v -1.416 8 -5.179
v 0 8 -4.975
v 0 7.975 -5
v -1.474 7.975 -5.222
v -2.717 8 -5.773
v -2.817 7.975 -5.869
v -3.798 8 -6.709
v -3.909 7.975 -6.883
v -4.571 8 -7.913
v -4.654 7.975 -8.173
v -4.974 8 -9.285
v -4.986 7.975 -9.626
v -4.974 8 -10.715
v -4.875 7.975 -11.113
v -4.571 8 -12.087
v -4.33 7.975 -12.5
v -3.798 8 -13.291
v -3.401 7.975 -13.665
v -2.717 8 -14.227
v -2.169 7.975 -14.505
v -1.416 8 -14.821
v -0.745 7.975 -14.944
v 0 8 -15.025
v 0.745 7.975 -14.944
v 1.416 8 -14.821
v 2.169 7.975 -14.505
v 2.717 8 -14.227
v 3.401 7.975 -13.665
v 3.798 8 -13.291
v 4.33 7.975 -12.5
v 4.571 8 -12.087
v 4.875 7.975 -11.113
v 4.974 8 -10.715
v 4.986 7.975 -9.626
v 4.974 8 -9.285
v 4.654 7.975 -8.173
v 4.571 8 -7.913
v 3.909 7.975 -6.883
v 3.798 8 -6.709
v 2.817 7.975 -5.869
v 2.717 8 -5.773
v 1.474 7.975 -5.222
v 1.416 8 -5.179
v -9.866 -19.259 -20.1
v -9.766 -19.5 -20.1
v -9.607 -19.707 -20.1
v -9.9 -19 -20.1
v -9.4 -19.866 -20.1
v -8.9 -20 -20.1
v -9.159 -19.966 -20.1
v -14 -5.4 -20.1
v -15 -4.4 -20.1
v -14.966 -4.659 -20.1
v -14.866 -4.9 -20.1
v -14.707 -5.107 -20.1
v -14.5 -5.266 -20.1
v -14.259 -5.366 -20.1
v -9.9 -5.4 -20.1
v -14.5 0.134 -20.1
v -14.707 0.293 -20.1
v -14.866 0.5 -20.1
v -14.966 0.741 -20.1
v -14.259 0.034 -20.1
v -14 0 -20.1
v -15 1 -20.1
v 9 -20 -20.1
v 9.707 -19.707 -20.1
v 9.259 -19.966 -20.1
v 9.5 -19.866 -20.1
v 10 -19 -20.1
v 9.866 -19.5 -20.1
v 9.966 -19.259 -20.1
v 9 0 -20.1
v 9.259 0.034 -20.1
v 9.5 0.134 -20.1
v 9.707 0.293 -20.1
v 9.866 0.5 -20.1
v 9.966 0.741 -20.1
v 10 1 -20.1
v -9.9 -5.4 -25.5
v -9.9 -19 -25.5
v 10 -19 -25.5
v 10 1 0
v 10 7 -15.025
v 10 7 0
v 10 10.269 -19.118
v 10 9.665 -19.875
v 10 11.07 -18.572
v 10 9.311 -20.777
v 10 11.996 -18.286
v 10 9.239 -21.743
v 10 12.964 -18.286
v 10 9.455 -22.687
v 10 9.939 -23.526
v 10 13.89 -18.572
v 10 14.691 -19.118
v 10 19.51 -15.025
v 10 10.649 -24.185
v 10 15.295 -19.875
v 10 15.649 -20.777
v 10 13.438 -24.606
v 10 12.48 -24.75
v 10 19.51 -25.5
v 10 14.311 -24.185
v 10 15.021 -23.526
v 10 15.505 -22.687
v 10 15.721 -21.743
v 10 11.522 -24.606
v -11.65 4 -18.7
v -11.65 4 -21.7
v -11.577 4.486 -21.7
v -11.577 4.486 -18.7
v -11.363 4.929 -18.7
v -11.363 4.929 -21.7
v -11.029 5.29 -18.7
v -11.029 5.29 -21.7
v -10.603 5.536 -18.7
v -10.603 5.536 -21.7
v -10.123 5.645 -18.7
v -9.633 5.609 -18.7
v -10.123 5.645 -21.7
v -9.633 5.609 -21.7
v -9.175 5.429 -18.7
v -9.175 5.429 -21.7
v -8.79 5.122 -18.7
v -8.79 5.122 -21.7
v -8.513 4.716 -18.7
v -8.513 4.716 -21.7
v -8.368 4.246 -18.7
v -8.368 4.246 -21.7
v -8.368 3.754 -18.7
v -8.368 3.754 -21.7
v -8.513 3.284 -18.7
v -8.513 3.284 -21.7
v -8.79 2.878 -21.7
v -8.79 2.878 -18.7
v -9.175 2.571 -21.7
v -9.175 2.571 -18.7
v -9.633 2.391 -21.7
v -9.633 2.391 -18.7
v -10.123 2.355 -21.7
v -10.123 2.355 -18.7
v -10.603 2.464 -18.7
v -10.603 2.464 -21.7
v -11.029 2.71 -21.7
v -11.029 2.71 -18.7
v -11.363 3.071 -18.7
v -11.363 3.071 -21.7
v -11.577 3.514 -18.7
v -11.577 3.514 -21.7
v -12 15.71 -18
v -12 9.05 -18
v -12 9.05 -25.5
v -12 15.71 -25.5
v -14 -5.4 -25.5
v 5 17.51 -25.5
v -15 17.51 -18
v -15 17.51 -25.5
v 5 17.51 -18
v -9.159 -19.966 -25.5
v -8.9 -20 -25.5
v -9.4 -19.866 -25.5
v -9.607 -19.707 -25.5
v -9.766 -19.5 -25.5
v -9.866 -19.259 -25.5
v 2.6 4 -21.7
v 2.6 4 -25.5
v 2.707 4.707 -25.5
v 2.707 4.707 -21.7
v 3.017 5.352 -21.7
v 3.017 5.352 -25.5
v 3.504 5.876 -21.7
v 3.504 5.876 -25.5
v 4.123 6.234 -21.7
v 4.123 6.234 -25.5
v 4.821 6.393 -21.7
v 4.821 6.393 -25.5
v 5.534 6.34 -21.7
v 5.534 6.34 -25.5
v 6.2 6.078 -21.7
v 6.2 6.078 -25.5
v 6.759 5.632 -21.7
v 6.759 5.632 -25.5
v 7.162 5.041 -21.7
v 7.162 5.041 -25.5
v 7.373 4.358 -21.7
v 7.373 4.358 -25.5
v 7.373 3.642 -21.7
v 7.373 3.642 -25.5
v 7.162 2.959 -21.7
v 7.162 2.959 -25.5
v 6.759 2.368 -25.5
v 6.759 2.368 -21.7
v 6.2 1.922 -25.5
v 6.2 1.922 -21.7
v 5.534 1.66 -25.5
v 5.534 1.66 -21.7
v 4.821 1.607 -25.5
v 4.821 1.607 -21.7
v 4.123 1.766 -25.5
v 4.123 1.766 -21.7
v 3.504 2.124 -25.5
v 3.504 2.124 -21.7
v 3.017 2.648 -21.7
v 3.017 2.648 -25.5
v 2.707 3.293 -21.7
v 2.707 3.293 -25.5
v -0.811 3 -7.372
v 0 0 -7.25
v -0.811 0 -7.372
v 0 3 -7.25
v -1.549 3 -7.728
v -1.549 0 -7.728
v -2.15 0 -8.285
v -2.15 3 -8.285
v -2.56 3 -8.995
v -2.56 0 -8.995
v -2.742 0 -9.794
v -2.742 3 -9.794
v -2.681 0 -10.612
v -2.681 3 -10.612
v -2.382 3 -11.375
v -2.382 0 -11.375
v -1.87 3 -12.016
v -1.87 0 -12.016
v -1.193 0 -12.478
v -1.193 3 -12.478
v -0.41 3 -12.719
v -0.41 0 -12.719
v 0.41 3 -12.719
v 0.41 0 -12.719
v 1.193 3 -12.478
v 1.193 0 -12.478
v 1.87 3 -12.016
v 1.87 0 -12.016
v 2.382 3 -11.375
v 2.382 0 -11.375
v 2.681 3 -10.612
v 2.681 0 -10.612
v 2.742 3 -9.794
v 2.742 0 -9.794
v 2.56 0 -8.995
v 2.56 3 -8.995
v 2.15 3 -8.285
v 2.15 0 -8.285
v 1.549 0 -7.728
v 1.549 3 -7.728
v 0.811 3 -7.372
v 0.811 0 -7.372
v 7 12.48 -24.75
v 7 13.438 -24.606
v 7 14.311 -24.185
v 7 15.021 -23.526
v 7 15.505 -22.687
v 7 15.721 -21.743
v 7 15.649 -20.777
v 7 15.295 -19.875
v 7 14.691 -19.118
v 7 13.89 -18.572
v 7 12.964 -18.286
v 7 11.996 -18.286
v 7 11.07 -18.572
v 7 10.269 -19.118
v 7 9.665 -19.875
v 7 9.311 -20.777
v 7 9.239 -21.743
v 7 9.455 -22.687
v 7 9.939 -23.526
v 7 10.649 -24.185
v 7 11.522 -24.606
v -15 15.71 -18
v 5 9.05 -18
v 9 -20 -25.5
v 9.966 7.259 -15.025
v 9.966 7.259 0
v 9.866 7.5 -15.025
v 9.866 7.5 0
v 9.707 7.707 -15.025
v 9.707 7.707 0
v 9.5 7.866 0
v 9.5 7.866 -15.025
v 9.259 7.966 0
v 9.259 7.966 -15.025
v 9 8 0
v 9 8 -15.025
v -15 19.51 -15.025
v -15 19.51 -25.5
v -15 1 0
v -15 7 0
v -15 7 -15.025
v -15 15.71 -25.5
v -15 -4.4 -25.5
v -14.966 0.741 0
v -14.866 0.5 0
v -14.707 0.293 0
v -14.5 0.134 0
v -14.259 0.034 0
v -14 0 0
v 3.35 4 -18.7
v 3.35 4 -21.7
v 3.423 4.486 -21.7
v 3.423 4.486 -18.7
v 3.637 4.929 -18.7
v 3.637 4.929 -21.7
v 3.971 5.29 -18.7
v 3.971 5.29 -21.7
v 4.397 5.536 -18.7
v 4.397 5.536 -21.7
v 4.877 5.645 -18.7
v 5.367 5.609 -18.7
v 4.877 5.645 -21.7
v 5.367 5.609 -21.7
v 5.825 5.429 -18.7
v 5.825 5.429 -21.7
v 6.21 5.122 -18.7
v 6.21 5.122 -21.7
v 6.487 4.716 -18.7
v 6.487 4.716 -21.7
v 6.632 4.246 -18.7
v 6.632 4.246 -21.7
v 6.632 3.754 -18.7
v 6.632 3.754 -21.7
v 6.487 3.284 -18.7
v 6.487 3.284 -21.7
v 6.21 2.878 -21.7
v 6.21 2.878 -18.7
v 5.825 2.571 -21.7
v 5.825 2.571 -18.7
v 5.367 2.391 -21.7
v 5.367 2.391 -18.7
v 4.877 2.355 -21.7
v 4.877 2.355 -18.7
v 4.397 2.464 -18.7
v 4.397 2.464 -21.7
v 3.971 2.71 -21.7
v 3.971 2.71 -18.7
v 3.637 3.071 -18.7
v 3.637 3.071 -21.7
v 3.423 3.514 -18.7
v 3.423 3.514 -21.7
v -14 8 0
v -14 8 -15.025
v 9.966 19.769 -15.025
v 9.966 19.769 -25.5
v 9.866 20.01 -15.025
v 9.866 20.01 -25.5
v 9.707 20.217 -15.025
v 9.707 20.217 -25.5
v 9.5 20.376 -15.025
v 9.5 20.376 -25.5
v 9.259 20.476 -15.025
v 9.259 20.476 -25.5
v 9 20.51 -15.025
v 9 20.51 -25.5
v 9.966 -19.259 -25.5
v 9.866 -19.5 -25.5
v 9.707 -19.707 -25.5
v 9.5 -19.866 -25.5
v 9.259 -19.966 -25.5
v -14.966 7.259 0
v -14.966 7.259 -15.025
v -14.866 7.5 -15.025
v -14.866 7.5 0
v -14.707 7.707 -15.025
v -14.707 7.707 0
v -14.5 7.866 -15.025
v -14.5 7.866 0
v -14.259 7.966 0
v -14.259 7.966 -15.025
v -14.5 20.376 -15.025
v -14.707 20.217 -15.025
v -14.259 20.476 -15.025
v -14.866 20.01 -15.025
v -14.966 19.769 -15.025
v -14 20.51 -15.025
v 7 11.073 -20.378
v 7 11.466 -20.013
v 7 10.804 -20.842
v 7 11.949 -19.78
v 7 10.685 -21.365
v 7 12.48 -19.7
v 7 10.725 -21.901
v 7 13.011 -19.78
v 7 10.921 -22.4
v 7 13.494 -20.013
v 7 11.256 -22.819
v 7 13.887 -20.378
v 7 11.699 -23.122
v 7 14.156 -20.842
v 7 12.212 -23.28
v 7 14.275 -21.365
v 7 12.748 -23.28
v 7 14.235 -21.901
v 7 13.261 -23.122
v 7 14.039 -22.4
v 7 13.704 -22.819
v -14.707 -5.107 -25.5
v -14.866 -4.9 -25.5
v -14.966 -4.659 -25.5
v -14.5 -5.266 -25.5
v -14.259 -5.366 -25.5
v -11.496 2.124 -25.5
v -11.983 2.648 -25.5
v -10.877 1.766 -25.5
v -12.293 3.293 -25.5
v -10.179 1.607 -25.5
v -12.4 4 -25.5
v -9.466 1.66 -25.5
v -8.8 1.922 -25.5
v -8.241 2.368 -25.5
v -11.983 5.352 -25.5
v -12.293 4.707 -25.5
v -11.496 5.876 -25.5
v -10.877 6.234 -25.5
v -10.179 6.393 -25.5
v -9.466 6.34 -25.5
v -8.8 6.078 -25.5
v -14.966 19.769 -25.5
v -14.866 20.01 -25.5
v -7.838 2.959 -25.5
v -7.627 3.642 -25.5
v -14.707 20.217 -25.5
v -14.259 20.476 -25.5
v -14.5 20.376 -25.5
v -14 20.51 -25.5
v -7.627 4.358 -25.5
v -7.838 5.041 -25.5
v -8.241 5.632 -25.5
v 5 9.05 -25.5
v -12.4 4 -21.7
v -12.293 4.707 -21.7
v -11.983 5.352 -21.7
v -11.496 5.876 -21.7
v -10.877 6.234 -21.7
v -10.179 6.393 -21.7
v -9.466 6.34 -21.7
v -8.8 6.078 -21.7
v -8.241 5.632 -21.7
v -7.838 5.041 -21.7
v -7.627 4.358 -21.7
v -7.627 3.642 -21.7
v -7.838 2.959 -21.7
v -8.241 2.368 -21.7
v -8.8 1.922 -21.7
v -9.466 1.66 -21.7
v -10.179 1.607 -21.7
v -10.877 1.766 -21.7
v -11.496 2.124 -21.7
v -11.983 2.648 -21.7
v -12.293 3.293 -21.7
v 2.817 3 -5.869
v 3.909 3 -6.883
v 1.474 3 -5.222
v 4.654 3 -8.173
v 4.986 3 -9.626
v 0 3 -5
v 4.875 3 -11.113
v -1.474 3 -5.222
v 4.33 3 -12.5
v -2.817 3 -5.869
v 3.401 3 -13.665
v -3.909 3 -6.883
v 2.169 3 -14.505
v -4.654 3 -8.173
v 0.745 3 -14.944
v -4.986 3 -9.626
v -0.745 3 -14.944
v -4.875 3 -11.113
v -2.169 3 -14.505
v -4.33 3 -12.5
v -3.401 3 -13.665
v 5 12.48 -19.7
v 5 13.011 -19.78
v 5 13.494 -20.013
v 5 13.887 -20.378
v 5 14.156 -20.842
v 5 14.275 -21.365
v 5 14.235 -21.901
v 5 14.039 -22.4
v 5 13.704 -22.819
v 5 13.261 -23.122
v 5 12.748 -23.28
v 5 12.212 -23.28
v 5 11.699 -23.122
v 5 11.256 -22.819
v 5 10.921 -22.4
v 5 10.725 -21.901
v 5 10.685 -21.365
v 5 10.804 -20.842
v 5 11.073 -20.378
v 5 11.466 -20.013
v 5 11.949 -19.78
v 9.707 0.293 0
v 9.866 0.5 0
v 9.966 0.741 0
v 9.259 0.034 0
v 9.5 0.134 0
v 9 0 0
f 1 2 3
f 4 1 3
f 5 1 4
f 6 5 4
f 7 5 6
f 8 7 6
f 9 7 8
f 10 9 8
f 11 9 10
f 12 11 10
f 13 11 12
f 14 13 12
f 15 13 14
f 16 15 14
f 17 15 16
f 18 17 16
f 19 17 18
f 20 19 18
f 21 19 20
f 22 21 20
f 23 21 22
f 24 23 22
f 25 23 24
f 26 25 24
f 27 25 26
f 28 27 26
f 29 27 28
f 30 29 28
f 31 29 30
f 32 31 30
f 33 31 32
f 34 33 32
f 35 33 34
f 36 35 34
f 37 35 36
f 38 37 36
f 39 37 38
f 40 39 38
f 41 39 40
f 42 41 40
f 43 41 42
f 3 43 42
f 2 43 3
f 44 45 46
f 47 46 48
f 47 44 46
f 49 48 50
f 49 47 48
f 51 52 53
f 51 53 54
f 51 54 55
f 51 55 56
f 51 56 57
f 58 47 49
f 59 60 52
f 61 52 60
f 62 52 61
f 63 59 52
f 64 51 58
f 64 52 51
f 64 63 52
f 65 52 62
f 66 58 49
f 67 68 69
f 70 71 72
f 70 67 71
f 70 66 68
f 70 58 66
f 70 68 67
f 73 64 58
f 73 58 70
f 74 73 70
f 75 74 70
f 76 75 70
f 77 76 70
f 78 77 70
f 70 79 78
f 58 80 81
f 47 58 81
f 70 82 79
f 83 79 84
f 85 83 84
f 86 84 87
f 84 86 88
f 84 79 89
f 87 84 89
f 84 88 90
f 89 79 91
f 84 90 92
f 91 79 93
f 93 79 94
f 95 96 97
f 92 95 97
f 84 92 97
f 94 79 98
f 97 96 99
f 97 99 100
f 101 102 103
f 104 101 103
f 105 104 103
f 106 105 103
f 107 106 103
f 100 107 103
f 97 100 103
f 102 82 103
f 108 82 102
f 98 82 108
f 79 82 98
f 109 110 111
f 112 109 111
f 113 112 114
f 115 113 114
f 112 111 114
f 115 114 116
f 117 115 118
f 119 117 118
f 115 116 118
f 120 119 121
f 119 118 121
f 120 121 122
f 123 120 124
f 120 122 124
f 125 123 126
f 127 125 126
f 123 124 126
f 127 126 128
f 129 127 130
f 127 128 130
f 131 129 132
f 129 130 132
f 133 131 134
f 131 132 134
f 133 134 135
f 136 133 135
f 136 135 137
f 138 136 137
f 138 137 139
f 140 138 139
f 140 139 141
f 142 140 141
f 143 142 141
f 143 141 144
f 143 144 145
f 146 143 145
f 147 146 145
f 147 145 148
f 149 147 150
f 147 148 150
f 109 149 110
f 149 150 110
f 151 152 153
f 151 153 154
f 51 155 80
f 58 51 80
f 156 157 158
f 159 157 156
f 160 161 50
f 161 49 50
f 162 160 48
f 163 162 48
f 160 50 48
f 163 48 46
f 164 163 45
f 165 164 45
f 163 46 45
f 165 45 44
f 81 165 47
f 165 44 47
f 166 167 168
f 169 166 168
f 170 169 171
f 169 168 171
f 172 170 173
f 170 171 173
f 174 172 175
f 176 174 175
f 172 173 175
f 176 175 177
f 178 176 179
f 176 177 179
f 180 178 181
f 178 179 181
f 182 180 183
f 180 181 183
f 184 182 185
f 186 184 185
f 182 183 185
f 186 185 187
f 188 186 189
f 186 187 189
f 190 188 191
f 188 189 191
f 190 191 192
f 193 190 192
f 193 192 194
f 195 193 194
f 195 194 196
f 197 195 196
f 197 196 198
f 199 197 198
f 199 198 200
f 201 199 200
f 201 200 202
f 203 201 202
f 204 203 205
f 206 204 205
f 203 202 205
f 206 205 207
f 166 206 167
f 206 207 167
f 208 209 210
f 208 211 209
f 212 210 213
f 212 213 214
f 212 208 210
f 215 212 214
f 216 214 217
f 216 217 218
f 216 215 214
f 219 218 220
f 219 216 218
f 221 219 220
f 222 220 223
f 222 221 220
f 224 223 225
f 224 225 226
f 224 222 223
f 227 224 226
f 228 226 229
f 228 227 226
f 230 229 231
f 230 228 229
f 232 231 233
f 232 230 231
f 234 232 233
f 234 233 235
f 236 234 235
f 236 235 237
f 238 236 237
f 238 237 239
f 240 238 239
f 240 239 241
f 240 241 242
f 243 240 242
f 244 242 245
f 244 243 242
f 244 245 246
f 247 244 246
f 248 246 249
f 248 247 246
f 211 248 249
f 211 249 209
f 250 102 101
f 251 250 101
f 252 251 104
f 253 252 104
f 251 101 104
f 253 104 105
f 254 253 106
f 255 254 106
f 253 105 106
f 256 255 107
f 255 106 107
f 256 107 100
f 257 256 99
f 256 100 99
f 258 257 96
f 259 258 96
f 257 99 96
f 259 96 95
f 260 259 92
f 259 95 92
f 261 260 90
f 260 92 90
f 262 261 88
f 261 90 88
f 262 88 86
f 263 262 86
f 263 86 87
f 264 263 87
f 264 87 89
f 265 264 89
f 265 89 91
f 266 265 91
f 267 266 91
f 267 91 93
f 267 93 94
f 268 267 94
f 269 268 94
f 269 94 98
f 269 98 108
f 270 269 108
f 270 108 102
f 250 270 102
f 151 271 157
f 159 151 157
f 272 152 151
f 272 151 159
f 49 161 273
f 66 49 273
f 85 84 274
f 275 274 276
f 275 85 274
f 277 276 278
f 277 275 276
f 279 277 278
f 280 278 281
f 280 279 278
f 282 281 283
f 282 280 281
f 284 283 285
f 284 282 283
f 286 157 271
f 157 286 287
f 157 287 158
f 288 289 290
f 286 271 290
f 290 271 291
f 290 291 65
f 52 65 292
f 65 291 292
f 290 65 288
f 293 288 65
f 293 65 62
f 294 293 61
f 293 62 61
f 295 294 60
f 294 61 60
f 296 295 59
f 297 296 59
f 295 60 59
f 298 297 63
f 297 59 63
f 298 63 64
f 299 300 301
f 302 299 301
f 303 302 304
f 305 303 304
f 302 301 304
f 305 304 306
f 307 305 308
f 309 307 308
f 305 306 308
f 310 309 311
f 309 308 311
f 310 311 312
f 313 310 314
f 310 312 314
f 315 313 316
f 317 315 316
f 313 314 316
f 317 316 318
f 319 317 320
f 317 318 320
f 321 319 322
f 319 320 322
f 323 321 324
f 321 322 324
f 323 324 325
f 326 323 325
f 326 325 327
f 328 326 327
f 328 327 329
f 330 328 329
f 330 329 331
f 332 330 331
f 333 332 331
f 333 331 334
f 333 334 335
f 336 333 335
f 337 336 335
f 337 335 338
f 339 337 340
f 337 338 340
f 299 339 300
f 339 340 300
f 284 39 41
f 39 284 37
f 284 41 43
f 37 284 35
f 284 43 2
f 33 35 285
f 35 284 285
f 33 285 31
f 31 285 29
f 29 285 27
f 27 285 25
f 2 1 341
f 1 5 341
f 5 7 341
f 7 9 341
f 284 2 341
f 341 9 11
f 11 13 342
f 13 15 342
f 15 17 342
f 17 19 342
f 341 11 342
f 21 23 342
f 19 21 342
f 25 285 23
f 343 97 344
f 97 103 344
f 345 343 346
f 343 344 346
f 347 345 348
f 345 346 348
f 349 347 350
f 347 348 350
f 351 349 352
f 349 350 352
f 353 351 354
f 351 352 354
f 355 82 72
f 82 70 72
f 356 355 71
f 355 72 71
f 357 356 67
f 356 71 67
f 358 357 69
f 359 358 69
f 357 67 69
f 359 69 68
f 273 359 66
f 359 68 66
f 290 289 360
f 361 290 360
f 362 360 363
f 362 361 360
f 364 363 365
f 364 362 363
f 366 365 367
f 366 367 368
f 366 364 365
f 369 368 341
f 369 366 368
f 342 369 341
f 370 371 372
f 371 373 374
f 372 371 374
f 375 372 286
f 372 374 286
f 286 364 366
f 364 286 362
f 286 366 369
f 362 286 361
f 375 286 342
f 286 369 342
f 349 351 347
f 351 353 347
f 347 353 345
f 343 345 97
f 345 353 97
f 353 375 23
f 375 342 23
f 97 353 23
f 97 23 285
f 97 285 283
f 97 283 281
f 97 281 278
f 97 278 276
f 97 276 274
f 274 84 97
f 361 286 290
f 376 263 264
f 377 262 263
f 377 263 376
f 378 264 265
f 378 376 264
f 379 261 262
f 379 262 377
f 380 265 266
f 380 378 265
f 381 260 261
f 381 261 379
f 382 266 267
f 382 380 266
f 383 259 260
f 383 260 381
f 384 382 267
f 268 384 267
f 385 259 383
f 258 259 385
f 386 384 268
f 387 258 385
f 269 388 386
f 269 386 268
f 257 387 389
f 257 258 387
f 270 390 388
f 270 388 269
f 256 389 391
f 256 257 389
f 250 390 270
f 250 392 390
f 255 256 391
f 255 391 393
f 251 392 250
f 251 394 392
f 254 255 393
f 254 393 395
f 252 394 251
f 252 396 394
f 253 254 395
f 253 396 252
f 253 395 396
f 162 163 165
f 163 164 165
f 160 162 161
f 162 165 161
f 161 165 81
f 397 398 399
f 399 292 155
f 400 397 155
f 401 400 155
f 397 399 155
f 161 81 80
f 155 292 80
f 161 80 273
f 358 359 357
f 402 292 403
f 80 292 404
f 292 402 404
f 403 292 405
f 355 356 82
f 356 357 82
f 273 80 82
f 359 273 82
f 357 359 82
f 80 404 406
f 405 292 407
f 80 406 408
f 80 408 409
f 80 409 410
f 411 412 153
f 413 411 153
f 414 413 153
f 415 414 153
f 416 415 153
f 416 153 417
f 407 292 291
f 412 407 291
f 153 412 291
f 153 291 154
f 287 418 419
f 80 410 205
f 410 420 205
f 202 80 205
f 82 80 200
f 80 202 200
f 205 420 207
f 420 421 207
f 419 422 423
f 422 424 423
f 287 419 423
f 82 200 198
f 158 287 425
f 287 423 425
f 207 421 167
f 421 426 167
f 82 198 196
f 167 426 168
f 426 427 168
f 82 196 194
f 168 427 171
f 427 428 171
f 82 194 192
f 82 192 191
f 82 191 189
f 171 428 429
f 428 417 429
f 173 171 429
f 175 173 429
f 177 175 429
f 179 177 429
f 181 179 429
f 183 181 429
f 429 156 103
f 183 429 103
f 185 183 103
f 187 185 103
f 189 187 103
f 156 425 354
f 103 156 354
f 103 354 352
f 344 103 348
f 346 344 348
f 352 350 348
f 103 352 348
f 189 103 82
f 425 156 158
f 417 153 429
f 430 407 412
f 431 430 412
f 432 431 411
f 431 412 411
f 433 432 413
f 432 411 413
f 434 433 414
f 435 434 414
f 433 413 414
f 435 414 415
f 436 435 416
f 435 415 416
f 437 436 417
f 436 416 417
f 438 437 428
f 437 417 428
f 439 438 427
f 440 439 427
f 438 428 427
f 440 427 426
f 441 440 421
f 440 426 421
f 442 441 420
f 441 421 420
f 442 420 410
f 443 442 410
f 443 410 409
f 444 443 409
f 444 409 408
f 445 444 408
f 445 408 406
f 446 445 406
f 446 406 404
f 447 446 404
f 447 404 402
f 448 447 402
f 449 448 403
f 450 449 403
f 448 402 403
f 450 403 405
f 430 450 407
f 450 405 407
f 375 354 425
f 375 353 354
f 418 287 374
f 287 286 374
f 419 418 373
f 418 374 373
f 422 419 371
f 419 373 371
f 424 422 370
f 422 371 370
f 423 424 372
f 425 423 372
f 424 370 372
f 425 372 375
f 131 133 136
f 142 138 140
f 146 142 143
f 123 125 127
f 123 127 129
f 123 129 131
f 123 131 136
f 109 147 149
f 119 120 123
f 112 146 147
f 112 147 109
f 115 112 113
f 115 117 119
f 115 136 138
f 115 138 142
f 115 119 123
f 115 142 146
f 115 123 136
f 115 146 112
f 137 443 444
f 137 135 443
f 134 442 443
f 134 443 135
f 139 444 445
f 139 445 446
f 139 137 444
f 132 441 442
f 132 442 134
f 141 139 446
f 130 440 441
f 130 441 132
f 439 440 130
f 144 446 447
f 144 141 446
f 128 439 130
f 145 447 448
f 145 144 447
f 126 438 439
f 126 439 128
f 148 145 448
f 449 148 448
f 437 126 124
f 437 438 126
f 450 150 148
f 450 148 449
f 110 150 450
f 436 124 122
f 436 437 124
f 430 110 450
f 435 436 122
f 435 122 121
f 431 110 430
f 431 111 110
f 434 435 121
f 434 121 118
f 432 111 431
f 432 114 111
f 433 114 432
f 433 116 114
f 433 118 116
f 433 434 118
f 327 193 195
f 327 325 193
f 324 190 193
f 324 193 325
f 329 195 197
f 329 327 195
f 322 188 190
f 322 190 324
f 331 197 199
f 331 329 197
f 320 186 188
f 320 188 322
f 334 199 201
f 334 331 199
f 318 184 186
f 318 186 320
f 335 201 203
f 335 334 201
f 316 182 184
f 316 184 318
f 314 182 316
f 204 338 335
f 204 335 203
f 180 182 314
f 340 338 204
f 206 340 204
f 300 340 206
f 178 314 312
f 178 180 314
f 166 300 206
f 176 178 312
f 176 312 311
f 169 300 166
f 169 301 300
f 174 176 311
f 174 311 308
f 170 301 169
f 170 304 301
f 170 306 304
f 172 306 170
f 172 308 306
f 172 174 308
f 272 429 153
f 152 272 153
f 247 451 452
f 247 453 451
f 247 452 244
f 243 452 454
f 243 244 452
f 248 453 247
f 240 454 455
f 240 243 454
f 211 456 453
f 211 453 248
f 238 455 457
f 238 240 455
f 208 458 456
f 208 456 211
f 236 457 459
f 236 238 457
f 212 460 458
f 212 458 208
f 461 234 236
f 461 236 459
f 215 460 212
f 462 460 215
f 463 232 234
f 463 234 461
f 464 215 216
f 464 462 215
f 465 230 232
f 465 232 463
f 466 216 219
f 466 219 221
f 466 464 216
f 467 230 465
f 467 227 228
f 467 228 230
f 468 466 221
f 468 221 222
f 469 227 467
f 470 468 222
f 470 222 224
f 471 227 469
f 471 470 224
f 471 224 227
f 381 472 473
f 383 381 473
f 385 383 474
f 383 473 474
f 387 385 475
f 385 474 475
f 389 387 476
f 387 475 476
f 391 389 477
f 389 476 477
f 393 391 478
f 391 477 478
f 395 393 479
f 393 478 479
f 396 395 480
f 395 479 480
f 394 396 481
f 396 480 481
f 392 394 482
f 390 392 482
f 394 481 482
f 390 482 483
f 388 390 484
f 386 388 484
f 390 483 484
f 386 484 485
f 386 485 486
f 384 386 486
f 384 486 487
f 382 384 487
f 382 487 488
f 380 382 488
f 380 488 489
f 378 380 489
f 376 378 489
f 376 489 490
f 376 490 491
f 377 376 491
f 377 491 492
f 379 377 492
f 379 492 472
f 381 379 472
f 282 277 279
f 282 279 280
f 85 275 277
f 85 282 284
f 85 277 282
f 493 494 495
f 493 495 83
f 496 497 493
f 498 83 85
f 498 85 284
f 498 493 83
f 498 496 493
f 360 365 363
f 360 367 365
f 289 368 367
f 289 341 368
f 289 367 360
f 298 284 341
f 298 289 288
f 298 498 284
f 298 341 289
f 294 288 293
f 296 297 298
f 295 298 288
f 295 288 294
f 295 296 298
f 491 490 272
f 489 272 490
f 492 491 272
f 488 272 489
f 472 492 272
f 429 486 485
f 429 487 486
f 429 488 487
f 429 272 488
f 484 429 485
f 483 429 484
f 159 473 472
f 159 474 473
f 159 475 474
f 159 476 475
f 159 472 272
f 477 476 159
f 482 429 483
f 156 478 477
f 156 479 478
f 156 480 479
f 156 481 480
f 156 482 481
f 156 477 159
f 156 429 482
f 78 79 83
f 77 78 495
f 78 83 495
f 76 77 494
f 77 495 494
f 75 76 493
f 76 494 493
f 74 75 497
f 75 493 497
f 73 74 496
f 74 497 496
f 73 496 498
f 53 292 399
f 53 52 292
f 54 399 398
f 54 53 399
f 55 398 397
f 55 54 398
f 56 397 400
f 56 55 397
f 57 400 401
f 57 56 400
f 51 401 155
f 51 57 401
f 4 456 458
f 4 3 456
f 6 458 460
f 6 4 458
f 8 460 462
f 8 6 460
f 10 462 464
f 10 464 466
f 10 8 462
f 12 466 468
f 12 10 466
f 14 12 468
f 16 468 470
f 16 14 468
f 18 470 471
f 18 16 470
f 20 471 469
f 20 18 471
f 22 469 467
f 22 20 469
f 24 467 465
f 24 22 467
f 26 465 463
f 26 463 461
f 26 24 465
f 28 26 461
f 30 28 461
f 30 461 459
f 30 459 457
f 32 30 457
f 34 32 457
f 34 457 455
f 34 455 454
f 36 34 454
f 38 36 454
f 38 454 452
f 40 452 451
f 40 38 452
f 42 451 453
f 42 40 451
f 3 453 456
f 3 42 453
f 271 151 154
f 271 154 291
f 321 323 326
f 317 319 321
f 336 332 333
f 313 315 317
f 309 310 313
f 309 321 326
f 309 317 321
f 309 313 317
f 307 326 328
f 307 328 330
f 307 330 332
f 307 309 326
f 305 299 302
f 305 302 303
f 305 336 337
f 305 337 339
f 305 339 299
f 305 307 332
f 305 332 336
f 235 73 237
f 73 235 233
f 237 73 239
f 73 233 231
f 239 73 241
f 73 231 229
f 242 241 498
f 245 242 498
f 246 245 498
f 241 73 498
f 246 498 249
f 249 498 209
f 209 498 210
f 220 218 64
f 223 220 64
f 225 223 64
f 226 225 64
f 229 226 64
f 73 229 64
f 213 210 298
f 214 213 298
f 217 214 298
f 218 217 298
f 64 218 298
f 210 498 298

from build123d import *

# Parameters (mm, degrees)
BOSS_EXTRUDE1_DEPTH            = 8
CBORE_FOR_M5_SHCS1_AT_2_COUNT  = 2
CBORE_FOR_M5_SHCS1_AT_2_PITCH  = 20
SKETCH5_W                      = 25
SKETCH5_H                      = 2.975
BOSS_EXTRUDE2_DEPTH            = 12.51
SKETCH6_W                      = 3
SKETCH6_H                      = 8.01
BOSS_EXTRUDE3_DEPTH            = 7.5
BOSS_EXTRUDE4_DEPTH            = 5.5
SKETCH8_W                      = 17
SKETCH8_H                      = 1.25
BOSS_EXTRUDE5_DEPTH            = 7.5
BOSS_EXTRUDE6_DEPTH            = 5.4
FILLET2_R                      = 1
CBORE_FOR_M3_SHCS1_D           = 3.6
CBORE_FOR_M3_SHCS1_DEPTH       = 5
CBORE_FOR_M3_SHCS1_CBORE_D     = 6.5
CBORE_FOR_M3_SHCS1_CBORE_DEPTH = 3
SKETCH13_R                     = 2.4
CUT_EXTRUDE1_DEPTH             = 3.8
SKETCH14_R                     = 1.65
CUT_EXTRUDE2_DEPTH             = 3
SKETCH15_W                     = 20
SKETCH15_H                     = 20
CUT_EXTRUDE3_DEPTH             = 29
SKETCH16_W                     = 17
SKETCH16_H                     = 0.2
SKETCH16_W_2                   = 3
SKETCH16_H_2                   = 0.3
CUT_EXTRUDE4_DEPTH             = 7.5


with BuildPart() as part:
    # Sketch1 → Boss-Extrude1 (new body)
    with BuildSketch(Plane(origin=(0, 0, 0), x_dir=(1, 0, 0), z_dir=(0, 1, 0))):
        Polygon((-10, 0), (-15, 0), (-15, 20), (-10, 20), (10, 20), (10, -20), (-10, -20), align=None)
    extrude(amount=BOSS_EXTRUDE1_DEPTH)

    # Sketch4 → CBORE for M5 SHCS1 (revolve, cut)
    with BuildSketch(Plane(origin=(0, 8, -10), x_dir=(0, 0, 1), z_dir=(1, 0, 0))):
        Polygon((0, 0), (0, 8), (2.75, 8), (2.75, 5), (5, 5), (5, 0.025), (5.025, 0), align=None)
    cbore_for_m5_shcs1 = revolve(axis=Axis((0, 14.35, -10), (0, -1, 0)), mode=Mode.SUBTRACT)

    # CBORE for M5 SHCS1 at 2: CBORE for M5 SHCS1 ×2
    with Locations(*[(0, 0, i * CBORE_FOR_M5_SHCS1_AT_2_PITCH) for i in range(1, CBORE_FOR_M5_SHCS1_AT_2_COUNT)]):
        add(cbore_for_m5_shcs1, mode=Mode.SUBTRACT)

    # Sketch5 → Boss-Extrude2 (add)
    with BuildSketch(Plane(origin=(0, 8, 0), x_dir=(1, 0, 0), z_dir=(0, 1, 0))):
        with Locations((-2.5, 16.5125)):
            Rectangle(SKETCH5_W, SKETCH5_H)
    extrude(amount=BOSS_EXTRUDE2_DEPTH)

    # Sketch6 → Boss-Extrude3 (add)
    with BuildSketch(Plane(origin=(0, 0, -18), x_dir=(-1, 0, 0), z_dir=(0, 0, -1))):
        Polygon((-10, 20.51), (15, 20.51), (15, 17.51), (-5, 17.51), (-5, 8), (-10, 8), (-10, 20), align=None)
        with Locations((13.5, 12.005)):
            Rectangle(SKETCH6_W, SKETCH6_H)
    extrude(amount=BOSS_EXTRUDE3_DEPTH)

    # Sketch7 → Boss-Extrude4 (add)
    with BuildSketch(Plane(origin=(0, 0, -20), x_dir=(-1, 0, 0), z_dir=(0, 0, -1))):
        Polygon((-10, 0), (15, 0), (15, 8), (12, 8), (-5, 8), (-10, 8), align=None)
    extrude(amount=BOSS_EXTRUDE4_DEPTH)

    # Sketch8 → Boss-Extrude5 (add)
    with BuildSketch(Plane(origin=(0, 0, -18), x_dir=(-1, 0, 0), z_dir=(0, 0, -1))):
        with Locations((3.5, 8.625)):
            Rectangle(SKETCH8_W, SKETCH8_H)
    extrude(amount=BOSS_EXTRUDE5_DEPTH)

    # Sketch9 → Boss-Extrude6 (add)
    with BuildSketch(Plane(origin=(0, 0, -25.5), x_dir=(-1, 0, 0), z_dir=(0, 0, -1))):
        Polygon((-10, 0), (15, 0), (15, -5.4), (9.9, -5.4), (9.9, -20), (-10, -20), align=None)
    extrude(amount=-BOSS_EXTRUDE6_DEPTH)

    # Fillet2
    fillet2_edges = [part.edges().sort_by_distance(p)[0] for p in [
        (10, 0, -0.05),
        (-15, 0, -10.05),
        (10, -20, -22.8),
        (-15, -5.4, -22.8),
        (-9.9, -20, -22.8),
        (-10, 8, 10),
        (-15, 8, -7.5125),
        (-15, 20.51, -20.2625),
        (10, 20.51, -20.2625),
        (10, 8, 2.4875),
    ]]
    fillet(fillet2_edges, radius=FILLET2_R)

    # CBORE for M3 SHCS1
    with Locations(Plane(origin=(10, 0, 0), x_dir=(0, 0, -1), z_dir=(1, 0, 0))):
        with Locations((21.5, 12.48)):
            CounterBoreHole(CBORE_FOR_M3_SHCS1_D / 2, CBORE_FOR_M3_SHCS1_CBORE_D / 2, CBORE_FOR_M3_SHCS1_CBORE_DEPTH, depth=CBORE_FOR_M3_SHCS1_DEPTH)

    # Sketch13 → Cut-Extrude1 (cut)
    with BuildSketch(Plane(origin=(0, 0, -25.5), x_dir=(-1, 0, 0), z_dir=(0, 0, -1))):
        with Locations((10, 4)):
            Circle(SKETCH13_R)
        with Locations((-5, 4)):
            Circle(SKETCH13_R)
    extrude(amount=-CUT_EXTRUDE1_DEPTH, mode=Mode.SUBTRACT)

    # Sketch14 → Cut-Extrude2 (cut)
    with BuildSketch(Plane(origin=(0, 0, -21.7), x_dir=(-1, 0, 0), z_dir=(0, 0, -1))):
        with Locations((-5, 4)):
            Circle(SKETCH14_R)
        with Locations((10, 4)):
            Circle(SKETCH14_R)
    extrude(amount=-CUT_EXTRUDE2_DEPTH, mode=Mode.SUBTRACT)

    # Sketch15 → Cut-Extrude3 (cut, through all)
    with BuildSketch(Plane(origin=(0, 8, 0), x_dir=(1, 0, 0), z_dir=(0, 1, 0))):
        with Locations((0, -10)):
            Rectangle(SKETCH15_W, SKETCH15_H)
    extrude(amount=-CUT_EXTRUDE3_DEPTH, mode=Mode.SUBTRACT)

    # Sketch16 → Cut-Extrude4 (cut)
    with BuildSketch(Plane(origin=(0, 0, -25.5), x_dir=(-1, 0, 0), z_dir=(0, 0, -1))):
        with Locations((3.5, 9.15)):
            Rectangle(SKETCH16_W, SKETCH16_H)
        with Locations((13.5, 15.86)):
            Rectangle(SKETCH16_W_2, SKETCH16_H_2)
    extrude(amount=-CUT_EXTRUDE4_DEPTH, mode=Mode.SUBTRACT)


solid = part.part
